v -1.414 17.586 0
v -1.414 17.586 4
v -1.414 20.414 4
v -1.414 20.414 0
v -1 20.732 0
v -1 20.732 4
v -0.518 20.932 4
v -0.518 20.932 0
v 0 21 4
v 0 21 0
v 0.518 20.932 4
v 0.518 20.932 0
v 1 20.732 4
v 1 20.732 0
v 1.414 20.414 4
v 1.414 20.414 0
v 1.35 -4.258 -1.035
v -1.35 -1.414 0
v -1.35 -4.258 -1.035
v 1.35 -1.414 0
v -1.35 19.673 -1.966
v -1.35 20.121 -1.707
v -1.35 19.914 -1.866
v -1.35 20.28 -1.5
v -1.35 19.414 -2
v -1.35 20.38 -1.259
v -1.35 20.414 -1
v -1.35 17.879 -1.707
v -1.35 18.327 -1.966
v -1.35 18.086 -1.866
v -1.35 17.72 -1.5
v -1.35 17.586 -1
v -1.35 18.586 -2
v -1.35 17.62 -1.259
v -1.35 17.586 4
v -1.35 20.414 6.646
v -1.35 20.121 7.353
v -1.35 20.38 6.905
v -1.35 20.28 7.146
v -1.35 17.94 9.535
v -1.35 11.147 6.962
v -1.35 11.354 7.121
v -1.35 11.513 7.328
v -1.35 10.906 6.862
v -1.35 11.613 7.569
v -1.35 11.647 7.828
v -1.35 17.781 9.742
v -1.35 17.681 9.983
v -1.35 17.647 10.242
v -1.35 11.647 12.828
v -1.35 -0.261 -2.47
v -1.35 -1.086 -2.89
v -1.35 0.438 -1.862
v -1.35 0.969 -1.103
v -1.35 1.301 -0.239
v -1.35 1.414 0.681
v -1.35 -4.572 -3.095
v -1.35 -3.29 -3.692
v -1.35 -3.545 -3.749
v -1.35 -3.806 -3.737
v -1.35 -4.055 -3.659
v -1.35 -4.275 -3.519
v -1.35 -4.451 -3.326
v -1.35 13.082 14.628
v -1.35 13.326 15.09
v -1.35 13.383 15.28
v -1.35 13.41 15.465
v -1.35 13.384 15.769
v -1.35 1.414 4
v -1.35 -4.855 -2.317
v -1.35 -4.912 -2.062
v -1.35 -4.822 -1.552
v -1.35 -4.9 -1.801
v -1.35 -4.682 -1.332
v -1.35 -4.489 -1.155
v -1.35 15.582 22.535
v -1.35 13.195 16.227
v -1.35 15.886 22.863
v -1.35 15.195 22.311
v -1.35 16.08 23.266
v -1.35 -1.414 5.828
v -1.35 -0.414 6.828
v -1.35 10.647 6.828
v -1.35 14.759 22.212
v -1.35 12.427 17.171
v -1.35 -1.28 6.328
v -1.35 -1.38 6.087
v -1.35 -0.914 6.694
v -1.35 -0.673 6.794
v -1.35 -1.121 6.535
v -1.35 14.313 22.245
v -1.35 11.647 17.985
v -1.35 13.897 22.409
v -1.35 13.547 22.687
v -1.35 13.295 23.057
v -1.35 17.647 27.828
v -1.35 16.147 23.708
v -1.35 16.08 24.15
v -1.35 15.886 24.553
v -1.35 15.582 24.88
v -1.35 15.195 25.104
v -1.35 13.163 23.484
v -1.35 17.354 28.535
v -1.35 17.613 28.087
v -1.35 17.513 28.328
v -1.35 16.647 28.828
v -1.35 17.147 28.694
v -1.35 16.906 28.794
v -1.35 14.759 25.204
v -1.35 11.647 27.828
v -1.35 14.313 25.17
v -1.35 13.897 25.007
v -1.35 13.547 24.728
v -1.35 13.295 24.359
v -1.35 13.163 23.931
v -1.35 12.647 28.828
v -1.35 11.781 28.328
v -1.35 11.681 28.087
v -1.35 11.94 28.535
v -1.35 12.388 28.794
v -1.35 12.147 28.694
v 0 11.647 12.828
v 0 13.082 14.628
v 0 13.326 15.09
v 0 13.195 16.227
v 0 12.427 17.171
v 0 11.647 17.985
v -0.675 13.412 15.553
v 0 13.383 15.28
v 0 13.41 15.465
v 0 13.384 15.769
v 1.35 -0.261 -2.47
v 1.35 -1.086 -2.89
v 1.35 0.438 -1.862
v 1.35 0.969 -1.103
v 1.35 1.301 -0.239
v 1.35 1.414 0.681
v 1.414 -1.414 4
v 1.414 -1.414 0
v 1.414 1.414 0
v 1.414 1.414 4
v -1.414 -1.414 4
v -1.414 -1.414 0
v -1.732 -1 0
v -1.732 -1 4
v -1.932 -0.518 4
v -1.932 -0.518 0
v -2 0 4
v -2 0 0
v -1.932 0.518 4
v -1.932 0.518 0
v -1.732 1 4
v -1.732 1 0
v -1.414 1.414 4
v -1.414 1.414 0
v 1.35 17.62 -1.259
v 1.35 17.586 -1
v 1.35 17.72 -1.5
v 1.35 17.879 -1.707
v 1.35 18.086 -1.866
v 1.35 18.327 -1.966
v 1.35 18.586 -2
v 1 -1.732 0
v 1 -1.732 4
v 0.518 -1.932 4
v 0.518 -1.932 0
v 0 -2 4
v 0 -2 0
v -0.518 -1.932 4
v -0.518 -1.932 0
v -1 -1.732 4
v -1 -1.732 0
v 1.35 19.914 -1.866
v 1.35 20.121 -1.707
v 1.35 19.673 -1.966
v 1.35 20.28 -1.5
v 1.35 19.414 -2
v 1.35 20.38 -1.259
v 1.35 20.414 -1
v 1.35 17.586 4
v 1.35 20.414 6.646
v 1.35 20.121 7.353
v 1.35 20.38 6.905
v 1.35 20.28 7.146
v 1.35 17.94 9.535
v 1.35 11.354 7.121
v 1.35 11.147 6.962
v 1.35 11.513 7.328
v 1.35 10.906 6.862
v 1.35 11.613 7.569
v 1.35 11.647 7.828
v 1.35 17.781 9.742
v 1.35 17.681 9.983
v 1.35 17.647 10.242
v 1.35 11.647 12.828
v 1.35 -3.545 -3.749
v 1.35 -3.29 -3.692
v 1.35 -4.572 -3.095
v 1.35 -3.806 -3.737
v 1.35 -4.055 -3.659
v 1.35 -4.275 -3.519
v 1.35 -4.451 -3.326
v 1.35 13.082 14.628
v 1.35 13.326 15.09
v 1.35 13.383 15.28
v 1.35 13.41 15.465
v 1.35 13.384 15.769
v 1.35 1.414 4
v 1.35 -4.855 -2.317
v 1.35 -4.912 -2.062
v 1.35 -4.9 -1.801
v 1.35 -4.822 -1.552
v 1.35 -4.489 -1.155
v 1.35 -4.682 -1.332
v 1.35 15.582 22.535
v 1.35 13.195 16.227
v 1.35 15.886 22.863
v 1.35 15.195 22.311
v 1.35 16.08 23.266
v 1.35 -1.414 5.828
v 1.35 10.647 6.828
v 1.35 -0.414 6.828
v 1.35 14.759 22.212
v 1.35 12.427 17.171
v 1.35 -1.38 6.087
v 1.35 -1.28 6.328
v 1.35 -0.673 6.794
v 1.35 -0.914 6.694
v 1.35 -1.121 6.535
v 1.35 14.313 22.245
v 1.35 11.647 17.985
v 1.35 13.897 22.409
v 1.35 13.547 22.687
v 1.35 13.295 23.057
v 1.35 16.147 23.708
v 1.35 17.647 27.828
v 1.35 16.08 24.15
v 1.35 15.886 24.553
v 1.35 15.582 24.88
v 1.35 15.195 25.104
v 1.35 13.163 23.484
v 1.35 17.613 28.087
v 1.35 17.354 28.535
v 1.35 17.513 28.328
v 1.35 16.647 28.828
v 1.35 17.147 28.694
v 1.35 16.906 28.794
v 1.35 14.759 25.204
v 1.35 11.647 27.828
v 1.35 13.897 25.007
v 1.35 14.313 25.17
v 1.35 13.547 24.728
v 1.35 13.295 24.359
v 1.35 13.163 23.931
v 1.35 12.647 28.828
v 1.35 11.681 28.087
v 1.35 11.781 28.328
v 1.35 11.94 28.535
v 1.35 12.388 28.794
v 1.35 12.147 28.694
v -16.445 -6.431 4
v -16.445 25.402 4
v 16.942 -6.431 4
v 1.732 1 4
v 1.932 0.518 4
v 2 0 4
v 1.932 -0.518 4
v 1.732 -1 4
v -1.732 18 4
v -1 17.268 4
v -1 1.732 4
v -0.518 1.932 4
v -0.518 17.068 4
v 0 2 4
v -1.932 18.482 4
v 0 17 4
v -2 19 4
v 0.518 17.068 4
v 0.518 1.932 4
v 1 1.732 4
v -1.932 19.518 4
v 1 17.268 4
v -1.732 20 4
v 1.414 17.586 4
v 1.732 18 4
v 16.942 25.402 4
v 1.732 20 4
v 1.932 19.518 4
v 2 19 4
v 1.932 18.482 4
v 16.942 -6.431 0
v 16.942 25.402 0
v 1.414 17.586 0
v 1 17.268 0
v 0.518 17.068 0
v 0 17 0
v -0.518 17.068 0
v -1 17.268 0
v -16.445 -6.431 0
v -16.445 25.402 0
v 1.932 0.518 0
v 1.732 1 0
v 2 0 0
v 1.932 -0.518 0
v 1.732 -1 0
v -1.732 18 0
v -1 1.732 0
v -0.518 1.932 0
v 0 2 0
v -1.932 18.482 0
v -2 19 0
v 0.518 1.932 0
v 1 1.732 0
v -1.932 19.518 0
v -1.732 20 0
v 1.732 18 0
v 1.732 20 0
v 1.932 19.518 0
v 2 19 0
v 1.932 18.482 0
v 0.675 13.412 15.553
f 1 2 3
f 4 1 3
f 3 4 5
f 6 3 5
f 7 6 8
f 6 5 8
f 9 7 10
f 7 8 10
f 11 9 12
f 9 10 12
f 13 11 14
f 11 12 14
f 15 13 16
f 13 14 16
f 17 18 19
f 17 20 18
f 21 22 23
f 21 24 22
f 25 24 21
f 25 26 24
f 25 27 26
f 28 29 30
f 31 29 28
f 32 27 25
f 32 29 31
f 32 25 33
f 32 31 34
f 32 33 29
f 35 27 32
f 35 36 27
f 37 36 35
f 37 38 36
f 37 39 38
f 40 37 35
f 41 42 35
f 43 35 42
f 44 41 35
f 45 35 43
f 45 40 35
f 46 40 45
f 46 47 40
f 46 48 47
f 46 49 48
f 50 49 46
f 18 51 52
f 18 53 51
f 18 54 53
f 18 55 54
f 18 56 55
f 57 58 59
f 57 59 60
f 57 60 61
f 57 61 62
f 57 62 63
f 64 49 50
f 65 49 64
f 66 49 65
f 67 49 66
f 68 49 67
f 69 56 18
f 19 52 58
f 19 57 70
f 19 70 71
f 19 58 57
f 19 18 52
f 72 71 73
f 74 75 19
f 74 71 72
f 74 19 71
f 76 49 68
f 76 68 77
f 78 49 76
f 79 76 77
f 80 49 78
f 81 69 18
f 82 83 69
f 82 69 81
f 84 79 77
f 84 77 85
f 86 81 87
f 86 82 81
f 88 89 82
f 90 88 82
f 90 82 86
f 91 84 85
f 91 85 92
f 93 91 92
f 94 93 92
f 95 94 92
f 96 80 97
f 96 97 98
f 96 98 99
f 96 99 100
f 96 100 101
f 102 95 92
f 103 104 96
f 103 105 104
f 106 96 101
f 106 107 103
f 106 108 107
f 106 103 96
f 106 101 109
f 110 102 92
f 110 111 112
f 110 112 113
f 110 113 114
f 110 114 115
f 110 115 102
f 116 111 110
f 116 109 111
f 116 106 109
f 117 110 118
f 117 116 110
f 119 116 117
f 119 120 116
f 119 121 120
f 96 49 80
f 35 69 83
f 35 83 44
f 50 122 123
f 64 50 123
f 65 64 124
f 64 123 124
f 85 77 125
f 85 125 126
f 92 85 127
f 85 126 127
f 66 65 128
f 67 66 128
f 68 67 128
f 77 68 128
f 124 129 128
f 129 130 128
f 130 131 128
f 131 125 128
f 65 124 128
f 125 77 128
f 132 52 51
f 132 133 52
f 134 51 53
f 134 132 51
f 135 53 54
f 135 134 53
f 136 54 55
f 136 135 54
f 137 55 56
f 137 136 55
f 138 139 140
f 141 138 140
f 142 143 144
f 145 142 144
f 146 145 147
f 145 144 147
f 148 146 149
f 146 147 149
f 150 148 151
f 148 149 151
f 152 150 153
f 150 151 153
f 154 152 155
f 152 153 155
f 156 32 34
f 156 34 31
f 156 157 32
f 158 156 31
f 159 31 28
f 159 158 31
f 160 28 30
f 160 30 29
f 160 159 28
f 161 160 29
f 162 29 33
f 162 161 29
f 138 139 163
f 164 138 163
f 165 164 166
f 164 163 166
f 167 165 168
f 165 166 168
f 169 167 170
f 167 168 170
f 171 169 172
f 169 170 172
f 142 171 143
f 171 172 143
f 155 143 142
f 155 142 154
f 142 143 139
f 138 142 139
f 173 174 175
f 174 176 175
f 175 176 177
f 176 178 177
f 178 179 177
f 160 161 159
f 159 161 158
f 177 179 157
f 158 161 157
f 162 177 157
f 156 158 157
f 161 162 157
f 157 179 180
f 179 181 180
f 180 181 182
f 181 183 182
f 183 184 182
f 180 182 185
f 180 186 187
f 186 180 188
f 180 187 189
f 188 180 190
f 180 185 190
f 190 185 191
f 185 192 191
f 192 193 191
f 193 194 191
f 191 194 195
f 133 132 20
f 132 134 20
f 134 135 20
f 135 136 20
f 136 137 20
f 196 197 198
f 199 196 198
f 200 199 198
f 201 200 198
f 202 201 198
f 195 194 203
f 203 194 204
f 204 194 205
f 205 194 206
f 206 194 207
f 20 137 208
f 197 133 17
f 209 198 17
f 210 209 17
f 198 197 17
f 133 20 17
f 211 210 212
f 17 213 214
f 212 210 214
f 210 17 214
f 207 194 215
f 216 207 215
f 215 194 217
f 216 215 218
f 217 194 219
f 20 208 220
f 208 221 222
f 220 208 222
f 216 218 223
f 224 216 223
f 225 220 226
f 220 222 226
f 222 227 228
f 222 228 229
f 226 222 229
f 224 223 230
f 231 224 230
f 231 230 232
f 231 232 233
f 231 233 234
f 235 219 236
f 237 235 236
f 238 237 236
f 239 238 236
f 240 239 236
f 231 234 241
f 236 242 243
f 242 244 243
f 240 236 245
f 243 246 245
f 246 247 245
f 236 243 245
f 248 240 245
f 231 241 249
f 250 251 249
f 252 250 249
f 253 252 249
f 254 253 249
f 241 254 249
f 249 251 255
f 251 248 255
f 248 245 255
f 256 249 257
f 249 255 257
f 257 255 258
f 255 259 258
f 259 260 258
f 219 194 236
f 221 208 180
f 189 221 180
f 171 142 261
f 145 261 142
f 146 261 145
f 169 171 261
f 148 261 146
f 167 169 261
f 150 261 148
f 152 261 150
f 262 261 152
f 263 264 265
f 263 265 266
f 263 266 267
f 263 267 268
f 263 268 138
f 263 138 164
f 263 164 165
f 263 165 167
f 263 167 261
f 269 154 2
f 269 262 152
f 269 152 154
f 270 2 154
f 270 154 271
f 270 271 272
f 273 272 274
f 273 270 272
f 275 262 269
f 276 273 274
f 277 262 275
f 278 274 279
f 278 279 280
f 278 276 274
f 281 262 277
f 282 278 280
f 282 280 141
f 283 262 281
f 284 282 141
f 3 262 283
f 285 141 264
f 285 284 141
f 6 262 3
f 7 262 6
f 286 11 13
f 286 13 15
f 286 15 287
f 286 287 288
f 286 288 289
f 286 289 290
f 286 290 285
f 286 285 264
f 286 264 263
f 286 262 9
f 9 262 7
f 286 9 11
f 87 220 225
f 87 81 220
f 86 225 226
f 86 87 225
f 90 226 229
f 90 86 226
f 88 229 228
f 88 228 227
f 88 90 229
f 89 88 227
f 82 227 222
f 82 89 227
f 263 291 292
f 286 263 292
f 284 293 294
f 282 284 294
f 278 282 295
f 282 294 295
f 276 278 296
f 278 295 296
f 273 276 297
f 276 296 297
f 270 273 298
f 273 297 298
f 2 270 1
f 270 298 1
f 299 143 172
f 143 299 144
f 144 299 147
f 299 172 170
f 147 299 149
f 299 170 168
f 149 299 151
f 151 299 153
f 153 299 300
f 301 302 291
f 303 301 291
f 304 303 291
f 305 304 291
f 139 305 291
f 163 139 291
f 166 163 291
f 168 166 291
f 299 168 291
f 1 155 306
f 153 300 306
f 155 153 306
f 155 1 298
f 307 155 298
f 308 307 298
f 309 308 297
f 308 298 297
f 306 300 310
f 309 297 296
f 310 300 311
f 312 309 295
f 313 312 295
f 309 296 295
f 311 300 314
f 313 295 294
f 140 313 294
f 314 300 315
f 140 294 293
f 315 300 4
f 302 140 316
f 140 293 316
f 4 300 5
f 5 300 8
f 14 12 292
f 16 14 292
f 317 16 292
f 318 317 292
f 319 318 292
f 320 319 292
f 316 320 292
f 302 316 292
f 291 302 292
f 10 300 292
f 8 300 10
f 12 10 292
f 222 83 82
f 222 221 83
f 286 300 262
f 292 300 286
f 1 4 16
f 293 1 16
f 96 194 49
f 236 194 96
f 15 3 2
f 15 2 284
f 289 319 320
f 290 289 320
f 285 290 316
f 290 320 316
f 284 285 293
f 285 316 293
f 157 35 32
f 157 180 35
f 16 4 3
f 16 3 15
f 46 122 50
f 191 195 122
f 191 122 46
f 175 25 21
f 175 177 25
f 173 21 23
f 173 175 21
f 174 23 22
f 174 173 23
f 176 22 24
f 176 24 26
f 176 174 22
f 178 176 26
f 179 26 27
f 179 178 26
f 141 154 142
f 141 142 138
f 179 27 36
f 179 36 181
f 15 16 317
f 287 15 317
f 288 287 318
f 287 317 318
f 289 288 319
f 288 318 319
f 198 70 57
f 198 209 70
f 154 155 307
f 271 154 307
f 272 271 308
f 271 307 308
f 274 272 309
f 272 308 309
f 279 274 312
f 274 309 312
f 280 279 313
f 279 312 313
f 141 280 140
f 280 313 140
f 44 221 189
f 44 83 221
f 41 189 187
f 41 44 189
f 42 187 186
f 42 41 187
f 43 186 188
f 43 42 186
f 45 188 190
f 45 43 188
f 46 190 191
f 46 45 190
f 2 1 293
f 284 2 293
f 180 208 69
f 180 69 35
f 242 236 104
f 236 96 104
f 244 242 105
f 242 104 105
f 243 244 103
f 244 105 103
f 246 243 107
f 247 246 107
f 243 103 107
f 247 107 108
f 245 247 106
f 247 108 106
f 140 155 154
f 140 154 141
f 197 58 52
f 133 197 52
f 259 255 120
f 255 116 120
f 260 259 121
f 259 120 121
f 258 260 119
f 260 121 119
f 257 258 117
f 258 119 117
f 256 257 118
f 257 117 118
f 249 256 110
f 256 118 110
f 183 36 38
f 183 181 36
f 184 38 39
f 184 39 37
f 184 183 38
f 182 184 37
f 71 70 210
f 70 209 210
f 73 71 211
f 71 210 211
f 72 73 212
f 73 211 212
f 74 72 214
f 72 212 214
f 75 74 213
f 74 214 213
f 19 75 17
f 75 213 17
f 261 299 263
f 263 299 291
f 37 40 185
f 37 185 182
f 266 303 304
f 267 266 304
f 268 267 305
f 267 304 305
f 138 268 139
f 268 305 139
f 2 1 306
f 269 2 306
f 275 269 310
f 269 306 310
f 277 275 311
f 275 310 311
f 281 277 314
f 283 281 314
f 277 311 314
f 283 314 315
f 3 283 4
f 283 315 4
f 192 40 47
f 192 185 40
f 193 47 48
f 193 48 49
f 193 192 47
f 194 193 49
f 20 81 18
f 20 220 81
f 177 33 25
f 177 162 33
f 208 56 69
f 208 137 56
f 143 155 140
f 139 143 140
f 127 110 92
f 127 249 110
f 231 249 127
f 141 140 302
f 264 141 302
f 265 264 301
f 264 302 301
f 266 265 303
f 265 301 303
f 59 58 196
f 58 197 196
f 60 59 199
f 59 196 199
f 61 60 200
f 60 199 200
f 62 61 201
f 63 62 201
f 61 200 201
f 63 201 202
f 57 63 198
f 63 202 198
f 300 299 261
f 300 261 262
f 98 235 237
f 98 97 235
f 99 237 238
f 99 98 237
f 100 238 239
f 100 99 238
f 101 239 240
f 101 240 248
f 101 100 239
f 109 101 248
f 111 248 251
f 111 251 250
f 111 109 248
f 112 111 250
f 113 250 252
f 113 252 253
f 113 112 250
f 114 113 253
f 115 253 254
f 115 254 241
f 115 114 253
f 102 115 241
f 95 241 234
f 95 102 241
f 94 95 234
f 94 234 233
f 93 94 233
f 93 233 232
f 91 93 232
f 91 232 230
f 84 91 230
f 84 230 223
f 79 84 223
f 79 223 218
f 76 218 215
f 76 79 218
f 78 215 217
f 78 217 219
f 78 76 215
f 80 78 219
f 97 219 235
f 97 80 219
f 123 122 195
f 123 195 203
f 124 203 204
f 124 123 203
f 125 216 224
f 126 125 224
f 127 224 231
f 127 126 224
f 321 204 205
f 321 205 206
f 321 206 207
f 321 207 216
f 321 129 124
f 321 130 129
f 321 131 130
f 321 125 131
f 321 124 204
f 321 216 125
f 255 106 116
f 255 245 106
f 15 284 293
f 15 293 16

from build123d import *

# Parameters (mm, degrees)
F1_W        = 33.3865592256
F1_H        = 31.8326419219
F2_DEPTH    = 4
F1_W_2      = 2.8284271247
F1_H_2      = 2.8284271247
F3_DEPTH    = 4
F4_R        = 1.5
F5_DEPTH    = 1.35
F6_T4_DEPTH = 2.7
F7_R        = 3.8
F8_R        = 1


# Not quite as in the source:
# - a fillet or chamfer that OpenCascade refuses, or shapes differently, is made with other operations: its cross-section is extruded or revolved along the edge and cut away or added


with BuildPart() as f2:
    # F1 (on Top) → F2 (new body)
    with BuildSketch(Plane.XY):
        with Locations((0.2483981661, 9.4852247275)):
            Rectangle(F1_W, F1_H)
        with BuildLine():
            ThreePointArc((1.4142135624, 1.4142135624), (1.847759065, 0.7653668647), (2, 0))
            ThreePointArc((2, 0), (1.847759065, -0.7653668647), (1.4142135624, -1.4142135624))
            ThreePointArc((1.4142135624, -1.4142135624), (0, -2), (-1.4142135624, -1.4142135624))
            ThreePointArc((-1.4142135624, -1.4142135624), (-2, 0), (-1.4142135624, 1.4142135624))
            ThreePointArc((-1.4142135624, 1.4142135624), (0, 2), (1.4142135624, 1.4142135624))
        make_face(mode=Mode.SUBTRACT)
        with BuildLine():
            ThreePointArc((1.4142135624, 20.4142135624), (1.847759065, 19.7653668647), (2, 19))
            ThreePointArc((2, 19), (1.847759065, 18.2346331353), (1.4142135624, 17.5857864376))
            ThreePointArc((1.4142135624, 17.5857864376), (0, 17), (-1.4142135624, 17.5857864376))
            ThreePointArc((-1.4142135624, 17.5857864376), (-2, 19), (-1.4142135624, 20.4142135624))
            ThreePointArc((-1.4142135624, 20.4142135624), (0, 21), (1.4142135624, 20.4142135624))
        make_face(mode=Mode.SUBTRACT)
    extrude(amount=F2_DEPTH)


with BuildPart() as f3:
    # F1 (on Top) → F3 (new body)
    with BuildSketch(Plane.XY):
        Rectangle(F1_W_2, F1_H_2)
    extrude(amount=F3_DEPTH)


with BuildPart() as f3b:
    # F1 (on Top) → F3, piece 2 (new body)
    with BuildSketch(Plane.XY):
        with Locations((0, 19)):
            Rectangle(F1_W_2, F1_H_2)
    extrude(amount=F3_DEPTH)


with BuildPart() as f5:
    # F4 (on Right) → F5 (new body, symmetric)
    with BuildSketch(Plane.YZ):
        with BuildLine():
            Line((-1.4142135624, 6.828), (-1.4142135624, 4))
            Line((-1.4142135624, 4), (-1.4142135624, 0))
            Line((-1.4142135624, 0), (-5.1972519021, -1.3769133508))
            Line((-5.1972519021, -1.3769133508), (-4.2300189368, -4.0343640823))
            Line((-4.2300189368, -4.0343640823), (1.4142135624, -1.9800314574))
            Line((1.4142135624, -1.9800314574), (1.4142135624, 0))
            Line((1.4142135624, 0), (1.4142135624, 4))
            Line((1.4142135624, 4), (17.5857864376, 4))
            Line((17.5857864376, 4), (17.5857864376, 0))
            Line((17.5857864376, 0), (17.5857864376, -2))
            Line((17.5857864376, -2), (20.4142135624, -2))
            Line((20.4142135624, -2), (20.4142135624, 0))
            Line((20.4142135624, 0), (20.4142135624, 4))
            Line((20.4142135624, 4), (20.4142135624, 6.828))
            Line((20.4142135624, 6.828), (17.646729894, 6.828))
            Line((17.646729894, 6.828), (17.646729894, 28.828))
            Line((17.646729894, 28.828), (11.646729894, 28.828))
            Line((11.646729894, 28.828), (11.646729894, 17.9849732667))
            add(Edge.make_bspline(
                [(11.646729894, 12.828), (12.1738818895, 13.7014529164), (14.6496330846, 15.5152462823), (12.174934911, 17.339967343), (11.646729894, 17.9849732667)],
                knots=[0, 0, 0, 0, 0.5096847631, 1, 1, 1, 1], degree=3))
            Line((11.646729894, 12.828), (11.646729894, 6.828))
            Line((11.646729894, 6.828), (-1.4142135624, 6.828))
        make_face()
        with Locations((14.646729894, 23.7077325583)):
            Circle(F4_R, mode=Mode.SUBTRACT)
    extrude(amount=F5_DEPTH, both=True)

    # F6: chamfer of 3 on 1 edges, made by hand


with BuildPart() as f6_tool2:
    # F6_s3 → F6_t4 (new body)
    with BuildSketch(Plane.YZ.offset(-1.35)):
        Polygon((17.646729894, 9.828), (20.646729894, 6.828), (17.646729894, 6.828), align=None)
    extrude(amount=F6_T4_DEPTH)

    split(bisect_by=Plane.XZ.offset(-20.4142135624), keep=Keep.TOP)


with BuildPart() as f5_1:
    add(f5.part)

    # F6_t1: union F6_tool2
    add(f6_tool2.part)

    # F7
    f7_edges = [f5_1.edges().sort_by_distance(p)[0] for p in [
        (0, 1.414214, -1.980031),
    ]]
    fillet(f7_edges, radius=F7_R)

    # F8
    f8_edges = [f5_1.edges().sort_by_distance(p)[0] for p in [
        (0, -5.197252, -1.376913),
        (0, -4.230019, -4.034364),
        (0, -1.414214, 6.828),
        (0, 11.64673, 6.828),
        (0, 11.64673, 28.828),
        (0, 17.64673, 28.828),
        (0, 17.585786, -2),
        (0, 20.414214, -2),
        (0, 20.414214, 7.060516),
        (0, 17.64673, 9.828),
    ]]
    fillet(f8_edges, radius=F8_R)


solid = Compound([f2.part, f3.part, f3b.part, f5_1.part])
